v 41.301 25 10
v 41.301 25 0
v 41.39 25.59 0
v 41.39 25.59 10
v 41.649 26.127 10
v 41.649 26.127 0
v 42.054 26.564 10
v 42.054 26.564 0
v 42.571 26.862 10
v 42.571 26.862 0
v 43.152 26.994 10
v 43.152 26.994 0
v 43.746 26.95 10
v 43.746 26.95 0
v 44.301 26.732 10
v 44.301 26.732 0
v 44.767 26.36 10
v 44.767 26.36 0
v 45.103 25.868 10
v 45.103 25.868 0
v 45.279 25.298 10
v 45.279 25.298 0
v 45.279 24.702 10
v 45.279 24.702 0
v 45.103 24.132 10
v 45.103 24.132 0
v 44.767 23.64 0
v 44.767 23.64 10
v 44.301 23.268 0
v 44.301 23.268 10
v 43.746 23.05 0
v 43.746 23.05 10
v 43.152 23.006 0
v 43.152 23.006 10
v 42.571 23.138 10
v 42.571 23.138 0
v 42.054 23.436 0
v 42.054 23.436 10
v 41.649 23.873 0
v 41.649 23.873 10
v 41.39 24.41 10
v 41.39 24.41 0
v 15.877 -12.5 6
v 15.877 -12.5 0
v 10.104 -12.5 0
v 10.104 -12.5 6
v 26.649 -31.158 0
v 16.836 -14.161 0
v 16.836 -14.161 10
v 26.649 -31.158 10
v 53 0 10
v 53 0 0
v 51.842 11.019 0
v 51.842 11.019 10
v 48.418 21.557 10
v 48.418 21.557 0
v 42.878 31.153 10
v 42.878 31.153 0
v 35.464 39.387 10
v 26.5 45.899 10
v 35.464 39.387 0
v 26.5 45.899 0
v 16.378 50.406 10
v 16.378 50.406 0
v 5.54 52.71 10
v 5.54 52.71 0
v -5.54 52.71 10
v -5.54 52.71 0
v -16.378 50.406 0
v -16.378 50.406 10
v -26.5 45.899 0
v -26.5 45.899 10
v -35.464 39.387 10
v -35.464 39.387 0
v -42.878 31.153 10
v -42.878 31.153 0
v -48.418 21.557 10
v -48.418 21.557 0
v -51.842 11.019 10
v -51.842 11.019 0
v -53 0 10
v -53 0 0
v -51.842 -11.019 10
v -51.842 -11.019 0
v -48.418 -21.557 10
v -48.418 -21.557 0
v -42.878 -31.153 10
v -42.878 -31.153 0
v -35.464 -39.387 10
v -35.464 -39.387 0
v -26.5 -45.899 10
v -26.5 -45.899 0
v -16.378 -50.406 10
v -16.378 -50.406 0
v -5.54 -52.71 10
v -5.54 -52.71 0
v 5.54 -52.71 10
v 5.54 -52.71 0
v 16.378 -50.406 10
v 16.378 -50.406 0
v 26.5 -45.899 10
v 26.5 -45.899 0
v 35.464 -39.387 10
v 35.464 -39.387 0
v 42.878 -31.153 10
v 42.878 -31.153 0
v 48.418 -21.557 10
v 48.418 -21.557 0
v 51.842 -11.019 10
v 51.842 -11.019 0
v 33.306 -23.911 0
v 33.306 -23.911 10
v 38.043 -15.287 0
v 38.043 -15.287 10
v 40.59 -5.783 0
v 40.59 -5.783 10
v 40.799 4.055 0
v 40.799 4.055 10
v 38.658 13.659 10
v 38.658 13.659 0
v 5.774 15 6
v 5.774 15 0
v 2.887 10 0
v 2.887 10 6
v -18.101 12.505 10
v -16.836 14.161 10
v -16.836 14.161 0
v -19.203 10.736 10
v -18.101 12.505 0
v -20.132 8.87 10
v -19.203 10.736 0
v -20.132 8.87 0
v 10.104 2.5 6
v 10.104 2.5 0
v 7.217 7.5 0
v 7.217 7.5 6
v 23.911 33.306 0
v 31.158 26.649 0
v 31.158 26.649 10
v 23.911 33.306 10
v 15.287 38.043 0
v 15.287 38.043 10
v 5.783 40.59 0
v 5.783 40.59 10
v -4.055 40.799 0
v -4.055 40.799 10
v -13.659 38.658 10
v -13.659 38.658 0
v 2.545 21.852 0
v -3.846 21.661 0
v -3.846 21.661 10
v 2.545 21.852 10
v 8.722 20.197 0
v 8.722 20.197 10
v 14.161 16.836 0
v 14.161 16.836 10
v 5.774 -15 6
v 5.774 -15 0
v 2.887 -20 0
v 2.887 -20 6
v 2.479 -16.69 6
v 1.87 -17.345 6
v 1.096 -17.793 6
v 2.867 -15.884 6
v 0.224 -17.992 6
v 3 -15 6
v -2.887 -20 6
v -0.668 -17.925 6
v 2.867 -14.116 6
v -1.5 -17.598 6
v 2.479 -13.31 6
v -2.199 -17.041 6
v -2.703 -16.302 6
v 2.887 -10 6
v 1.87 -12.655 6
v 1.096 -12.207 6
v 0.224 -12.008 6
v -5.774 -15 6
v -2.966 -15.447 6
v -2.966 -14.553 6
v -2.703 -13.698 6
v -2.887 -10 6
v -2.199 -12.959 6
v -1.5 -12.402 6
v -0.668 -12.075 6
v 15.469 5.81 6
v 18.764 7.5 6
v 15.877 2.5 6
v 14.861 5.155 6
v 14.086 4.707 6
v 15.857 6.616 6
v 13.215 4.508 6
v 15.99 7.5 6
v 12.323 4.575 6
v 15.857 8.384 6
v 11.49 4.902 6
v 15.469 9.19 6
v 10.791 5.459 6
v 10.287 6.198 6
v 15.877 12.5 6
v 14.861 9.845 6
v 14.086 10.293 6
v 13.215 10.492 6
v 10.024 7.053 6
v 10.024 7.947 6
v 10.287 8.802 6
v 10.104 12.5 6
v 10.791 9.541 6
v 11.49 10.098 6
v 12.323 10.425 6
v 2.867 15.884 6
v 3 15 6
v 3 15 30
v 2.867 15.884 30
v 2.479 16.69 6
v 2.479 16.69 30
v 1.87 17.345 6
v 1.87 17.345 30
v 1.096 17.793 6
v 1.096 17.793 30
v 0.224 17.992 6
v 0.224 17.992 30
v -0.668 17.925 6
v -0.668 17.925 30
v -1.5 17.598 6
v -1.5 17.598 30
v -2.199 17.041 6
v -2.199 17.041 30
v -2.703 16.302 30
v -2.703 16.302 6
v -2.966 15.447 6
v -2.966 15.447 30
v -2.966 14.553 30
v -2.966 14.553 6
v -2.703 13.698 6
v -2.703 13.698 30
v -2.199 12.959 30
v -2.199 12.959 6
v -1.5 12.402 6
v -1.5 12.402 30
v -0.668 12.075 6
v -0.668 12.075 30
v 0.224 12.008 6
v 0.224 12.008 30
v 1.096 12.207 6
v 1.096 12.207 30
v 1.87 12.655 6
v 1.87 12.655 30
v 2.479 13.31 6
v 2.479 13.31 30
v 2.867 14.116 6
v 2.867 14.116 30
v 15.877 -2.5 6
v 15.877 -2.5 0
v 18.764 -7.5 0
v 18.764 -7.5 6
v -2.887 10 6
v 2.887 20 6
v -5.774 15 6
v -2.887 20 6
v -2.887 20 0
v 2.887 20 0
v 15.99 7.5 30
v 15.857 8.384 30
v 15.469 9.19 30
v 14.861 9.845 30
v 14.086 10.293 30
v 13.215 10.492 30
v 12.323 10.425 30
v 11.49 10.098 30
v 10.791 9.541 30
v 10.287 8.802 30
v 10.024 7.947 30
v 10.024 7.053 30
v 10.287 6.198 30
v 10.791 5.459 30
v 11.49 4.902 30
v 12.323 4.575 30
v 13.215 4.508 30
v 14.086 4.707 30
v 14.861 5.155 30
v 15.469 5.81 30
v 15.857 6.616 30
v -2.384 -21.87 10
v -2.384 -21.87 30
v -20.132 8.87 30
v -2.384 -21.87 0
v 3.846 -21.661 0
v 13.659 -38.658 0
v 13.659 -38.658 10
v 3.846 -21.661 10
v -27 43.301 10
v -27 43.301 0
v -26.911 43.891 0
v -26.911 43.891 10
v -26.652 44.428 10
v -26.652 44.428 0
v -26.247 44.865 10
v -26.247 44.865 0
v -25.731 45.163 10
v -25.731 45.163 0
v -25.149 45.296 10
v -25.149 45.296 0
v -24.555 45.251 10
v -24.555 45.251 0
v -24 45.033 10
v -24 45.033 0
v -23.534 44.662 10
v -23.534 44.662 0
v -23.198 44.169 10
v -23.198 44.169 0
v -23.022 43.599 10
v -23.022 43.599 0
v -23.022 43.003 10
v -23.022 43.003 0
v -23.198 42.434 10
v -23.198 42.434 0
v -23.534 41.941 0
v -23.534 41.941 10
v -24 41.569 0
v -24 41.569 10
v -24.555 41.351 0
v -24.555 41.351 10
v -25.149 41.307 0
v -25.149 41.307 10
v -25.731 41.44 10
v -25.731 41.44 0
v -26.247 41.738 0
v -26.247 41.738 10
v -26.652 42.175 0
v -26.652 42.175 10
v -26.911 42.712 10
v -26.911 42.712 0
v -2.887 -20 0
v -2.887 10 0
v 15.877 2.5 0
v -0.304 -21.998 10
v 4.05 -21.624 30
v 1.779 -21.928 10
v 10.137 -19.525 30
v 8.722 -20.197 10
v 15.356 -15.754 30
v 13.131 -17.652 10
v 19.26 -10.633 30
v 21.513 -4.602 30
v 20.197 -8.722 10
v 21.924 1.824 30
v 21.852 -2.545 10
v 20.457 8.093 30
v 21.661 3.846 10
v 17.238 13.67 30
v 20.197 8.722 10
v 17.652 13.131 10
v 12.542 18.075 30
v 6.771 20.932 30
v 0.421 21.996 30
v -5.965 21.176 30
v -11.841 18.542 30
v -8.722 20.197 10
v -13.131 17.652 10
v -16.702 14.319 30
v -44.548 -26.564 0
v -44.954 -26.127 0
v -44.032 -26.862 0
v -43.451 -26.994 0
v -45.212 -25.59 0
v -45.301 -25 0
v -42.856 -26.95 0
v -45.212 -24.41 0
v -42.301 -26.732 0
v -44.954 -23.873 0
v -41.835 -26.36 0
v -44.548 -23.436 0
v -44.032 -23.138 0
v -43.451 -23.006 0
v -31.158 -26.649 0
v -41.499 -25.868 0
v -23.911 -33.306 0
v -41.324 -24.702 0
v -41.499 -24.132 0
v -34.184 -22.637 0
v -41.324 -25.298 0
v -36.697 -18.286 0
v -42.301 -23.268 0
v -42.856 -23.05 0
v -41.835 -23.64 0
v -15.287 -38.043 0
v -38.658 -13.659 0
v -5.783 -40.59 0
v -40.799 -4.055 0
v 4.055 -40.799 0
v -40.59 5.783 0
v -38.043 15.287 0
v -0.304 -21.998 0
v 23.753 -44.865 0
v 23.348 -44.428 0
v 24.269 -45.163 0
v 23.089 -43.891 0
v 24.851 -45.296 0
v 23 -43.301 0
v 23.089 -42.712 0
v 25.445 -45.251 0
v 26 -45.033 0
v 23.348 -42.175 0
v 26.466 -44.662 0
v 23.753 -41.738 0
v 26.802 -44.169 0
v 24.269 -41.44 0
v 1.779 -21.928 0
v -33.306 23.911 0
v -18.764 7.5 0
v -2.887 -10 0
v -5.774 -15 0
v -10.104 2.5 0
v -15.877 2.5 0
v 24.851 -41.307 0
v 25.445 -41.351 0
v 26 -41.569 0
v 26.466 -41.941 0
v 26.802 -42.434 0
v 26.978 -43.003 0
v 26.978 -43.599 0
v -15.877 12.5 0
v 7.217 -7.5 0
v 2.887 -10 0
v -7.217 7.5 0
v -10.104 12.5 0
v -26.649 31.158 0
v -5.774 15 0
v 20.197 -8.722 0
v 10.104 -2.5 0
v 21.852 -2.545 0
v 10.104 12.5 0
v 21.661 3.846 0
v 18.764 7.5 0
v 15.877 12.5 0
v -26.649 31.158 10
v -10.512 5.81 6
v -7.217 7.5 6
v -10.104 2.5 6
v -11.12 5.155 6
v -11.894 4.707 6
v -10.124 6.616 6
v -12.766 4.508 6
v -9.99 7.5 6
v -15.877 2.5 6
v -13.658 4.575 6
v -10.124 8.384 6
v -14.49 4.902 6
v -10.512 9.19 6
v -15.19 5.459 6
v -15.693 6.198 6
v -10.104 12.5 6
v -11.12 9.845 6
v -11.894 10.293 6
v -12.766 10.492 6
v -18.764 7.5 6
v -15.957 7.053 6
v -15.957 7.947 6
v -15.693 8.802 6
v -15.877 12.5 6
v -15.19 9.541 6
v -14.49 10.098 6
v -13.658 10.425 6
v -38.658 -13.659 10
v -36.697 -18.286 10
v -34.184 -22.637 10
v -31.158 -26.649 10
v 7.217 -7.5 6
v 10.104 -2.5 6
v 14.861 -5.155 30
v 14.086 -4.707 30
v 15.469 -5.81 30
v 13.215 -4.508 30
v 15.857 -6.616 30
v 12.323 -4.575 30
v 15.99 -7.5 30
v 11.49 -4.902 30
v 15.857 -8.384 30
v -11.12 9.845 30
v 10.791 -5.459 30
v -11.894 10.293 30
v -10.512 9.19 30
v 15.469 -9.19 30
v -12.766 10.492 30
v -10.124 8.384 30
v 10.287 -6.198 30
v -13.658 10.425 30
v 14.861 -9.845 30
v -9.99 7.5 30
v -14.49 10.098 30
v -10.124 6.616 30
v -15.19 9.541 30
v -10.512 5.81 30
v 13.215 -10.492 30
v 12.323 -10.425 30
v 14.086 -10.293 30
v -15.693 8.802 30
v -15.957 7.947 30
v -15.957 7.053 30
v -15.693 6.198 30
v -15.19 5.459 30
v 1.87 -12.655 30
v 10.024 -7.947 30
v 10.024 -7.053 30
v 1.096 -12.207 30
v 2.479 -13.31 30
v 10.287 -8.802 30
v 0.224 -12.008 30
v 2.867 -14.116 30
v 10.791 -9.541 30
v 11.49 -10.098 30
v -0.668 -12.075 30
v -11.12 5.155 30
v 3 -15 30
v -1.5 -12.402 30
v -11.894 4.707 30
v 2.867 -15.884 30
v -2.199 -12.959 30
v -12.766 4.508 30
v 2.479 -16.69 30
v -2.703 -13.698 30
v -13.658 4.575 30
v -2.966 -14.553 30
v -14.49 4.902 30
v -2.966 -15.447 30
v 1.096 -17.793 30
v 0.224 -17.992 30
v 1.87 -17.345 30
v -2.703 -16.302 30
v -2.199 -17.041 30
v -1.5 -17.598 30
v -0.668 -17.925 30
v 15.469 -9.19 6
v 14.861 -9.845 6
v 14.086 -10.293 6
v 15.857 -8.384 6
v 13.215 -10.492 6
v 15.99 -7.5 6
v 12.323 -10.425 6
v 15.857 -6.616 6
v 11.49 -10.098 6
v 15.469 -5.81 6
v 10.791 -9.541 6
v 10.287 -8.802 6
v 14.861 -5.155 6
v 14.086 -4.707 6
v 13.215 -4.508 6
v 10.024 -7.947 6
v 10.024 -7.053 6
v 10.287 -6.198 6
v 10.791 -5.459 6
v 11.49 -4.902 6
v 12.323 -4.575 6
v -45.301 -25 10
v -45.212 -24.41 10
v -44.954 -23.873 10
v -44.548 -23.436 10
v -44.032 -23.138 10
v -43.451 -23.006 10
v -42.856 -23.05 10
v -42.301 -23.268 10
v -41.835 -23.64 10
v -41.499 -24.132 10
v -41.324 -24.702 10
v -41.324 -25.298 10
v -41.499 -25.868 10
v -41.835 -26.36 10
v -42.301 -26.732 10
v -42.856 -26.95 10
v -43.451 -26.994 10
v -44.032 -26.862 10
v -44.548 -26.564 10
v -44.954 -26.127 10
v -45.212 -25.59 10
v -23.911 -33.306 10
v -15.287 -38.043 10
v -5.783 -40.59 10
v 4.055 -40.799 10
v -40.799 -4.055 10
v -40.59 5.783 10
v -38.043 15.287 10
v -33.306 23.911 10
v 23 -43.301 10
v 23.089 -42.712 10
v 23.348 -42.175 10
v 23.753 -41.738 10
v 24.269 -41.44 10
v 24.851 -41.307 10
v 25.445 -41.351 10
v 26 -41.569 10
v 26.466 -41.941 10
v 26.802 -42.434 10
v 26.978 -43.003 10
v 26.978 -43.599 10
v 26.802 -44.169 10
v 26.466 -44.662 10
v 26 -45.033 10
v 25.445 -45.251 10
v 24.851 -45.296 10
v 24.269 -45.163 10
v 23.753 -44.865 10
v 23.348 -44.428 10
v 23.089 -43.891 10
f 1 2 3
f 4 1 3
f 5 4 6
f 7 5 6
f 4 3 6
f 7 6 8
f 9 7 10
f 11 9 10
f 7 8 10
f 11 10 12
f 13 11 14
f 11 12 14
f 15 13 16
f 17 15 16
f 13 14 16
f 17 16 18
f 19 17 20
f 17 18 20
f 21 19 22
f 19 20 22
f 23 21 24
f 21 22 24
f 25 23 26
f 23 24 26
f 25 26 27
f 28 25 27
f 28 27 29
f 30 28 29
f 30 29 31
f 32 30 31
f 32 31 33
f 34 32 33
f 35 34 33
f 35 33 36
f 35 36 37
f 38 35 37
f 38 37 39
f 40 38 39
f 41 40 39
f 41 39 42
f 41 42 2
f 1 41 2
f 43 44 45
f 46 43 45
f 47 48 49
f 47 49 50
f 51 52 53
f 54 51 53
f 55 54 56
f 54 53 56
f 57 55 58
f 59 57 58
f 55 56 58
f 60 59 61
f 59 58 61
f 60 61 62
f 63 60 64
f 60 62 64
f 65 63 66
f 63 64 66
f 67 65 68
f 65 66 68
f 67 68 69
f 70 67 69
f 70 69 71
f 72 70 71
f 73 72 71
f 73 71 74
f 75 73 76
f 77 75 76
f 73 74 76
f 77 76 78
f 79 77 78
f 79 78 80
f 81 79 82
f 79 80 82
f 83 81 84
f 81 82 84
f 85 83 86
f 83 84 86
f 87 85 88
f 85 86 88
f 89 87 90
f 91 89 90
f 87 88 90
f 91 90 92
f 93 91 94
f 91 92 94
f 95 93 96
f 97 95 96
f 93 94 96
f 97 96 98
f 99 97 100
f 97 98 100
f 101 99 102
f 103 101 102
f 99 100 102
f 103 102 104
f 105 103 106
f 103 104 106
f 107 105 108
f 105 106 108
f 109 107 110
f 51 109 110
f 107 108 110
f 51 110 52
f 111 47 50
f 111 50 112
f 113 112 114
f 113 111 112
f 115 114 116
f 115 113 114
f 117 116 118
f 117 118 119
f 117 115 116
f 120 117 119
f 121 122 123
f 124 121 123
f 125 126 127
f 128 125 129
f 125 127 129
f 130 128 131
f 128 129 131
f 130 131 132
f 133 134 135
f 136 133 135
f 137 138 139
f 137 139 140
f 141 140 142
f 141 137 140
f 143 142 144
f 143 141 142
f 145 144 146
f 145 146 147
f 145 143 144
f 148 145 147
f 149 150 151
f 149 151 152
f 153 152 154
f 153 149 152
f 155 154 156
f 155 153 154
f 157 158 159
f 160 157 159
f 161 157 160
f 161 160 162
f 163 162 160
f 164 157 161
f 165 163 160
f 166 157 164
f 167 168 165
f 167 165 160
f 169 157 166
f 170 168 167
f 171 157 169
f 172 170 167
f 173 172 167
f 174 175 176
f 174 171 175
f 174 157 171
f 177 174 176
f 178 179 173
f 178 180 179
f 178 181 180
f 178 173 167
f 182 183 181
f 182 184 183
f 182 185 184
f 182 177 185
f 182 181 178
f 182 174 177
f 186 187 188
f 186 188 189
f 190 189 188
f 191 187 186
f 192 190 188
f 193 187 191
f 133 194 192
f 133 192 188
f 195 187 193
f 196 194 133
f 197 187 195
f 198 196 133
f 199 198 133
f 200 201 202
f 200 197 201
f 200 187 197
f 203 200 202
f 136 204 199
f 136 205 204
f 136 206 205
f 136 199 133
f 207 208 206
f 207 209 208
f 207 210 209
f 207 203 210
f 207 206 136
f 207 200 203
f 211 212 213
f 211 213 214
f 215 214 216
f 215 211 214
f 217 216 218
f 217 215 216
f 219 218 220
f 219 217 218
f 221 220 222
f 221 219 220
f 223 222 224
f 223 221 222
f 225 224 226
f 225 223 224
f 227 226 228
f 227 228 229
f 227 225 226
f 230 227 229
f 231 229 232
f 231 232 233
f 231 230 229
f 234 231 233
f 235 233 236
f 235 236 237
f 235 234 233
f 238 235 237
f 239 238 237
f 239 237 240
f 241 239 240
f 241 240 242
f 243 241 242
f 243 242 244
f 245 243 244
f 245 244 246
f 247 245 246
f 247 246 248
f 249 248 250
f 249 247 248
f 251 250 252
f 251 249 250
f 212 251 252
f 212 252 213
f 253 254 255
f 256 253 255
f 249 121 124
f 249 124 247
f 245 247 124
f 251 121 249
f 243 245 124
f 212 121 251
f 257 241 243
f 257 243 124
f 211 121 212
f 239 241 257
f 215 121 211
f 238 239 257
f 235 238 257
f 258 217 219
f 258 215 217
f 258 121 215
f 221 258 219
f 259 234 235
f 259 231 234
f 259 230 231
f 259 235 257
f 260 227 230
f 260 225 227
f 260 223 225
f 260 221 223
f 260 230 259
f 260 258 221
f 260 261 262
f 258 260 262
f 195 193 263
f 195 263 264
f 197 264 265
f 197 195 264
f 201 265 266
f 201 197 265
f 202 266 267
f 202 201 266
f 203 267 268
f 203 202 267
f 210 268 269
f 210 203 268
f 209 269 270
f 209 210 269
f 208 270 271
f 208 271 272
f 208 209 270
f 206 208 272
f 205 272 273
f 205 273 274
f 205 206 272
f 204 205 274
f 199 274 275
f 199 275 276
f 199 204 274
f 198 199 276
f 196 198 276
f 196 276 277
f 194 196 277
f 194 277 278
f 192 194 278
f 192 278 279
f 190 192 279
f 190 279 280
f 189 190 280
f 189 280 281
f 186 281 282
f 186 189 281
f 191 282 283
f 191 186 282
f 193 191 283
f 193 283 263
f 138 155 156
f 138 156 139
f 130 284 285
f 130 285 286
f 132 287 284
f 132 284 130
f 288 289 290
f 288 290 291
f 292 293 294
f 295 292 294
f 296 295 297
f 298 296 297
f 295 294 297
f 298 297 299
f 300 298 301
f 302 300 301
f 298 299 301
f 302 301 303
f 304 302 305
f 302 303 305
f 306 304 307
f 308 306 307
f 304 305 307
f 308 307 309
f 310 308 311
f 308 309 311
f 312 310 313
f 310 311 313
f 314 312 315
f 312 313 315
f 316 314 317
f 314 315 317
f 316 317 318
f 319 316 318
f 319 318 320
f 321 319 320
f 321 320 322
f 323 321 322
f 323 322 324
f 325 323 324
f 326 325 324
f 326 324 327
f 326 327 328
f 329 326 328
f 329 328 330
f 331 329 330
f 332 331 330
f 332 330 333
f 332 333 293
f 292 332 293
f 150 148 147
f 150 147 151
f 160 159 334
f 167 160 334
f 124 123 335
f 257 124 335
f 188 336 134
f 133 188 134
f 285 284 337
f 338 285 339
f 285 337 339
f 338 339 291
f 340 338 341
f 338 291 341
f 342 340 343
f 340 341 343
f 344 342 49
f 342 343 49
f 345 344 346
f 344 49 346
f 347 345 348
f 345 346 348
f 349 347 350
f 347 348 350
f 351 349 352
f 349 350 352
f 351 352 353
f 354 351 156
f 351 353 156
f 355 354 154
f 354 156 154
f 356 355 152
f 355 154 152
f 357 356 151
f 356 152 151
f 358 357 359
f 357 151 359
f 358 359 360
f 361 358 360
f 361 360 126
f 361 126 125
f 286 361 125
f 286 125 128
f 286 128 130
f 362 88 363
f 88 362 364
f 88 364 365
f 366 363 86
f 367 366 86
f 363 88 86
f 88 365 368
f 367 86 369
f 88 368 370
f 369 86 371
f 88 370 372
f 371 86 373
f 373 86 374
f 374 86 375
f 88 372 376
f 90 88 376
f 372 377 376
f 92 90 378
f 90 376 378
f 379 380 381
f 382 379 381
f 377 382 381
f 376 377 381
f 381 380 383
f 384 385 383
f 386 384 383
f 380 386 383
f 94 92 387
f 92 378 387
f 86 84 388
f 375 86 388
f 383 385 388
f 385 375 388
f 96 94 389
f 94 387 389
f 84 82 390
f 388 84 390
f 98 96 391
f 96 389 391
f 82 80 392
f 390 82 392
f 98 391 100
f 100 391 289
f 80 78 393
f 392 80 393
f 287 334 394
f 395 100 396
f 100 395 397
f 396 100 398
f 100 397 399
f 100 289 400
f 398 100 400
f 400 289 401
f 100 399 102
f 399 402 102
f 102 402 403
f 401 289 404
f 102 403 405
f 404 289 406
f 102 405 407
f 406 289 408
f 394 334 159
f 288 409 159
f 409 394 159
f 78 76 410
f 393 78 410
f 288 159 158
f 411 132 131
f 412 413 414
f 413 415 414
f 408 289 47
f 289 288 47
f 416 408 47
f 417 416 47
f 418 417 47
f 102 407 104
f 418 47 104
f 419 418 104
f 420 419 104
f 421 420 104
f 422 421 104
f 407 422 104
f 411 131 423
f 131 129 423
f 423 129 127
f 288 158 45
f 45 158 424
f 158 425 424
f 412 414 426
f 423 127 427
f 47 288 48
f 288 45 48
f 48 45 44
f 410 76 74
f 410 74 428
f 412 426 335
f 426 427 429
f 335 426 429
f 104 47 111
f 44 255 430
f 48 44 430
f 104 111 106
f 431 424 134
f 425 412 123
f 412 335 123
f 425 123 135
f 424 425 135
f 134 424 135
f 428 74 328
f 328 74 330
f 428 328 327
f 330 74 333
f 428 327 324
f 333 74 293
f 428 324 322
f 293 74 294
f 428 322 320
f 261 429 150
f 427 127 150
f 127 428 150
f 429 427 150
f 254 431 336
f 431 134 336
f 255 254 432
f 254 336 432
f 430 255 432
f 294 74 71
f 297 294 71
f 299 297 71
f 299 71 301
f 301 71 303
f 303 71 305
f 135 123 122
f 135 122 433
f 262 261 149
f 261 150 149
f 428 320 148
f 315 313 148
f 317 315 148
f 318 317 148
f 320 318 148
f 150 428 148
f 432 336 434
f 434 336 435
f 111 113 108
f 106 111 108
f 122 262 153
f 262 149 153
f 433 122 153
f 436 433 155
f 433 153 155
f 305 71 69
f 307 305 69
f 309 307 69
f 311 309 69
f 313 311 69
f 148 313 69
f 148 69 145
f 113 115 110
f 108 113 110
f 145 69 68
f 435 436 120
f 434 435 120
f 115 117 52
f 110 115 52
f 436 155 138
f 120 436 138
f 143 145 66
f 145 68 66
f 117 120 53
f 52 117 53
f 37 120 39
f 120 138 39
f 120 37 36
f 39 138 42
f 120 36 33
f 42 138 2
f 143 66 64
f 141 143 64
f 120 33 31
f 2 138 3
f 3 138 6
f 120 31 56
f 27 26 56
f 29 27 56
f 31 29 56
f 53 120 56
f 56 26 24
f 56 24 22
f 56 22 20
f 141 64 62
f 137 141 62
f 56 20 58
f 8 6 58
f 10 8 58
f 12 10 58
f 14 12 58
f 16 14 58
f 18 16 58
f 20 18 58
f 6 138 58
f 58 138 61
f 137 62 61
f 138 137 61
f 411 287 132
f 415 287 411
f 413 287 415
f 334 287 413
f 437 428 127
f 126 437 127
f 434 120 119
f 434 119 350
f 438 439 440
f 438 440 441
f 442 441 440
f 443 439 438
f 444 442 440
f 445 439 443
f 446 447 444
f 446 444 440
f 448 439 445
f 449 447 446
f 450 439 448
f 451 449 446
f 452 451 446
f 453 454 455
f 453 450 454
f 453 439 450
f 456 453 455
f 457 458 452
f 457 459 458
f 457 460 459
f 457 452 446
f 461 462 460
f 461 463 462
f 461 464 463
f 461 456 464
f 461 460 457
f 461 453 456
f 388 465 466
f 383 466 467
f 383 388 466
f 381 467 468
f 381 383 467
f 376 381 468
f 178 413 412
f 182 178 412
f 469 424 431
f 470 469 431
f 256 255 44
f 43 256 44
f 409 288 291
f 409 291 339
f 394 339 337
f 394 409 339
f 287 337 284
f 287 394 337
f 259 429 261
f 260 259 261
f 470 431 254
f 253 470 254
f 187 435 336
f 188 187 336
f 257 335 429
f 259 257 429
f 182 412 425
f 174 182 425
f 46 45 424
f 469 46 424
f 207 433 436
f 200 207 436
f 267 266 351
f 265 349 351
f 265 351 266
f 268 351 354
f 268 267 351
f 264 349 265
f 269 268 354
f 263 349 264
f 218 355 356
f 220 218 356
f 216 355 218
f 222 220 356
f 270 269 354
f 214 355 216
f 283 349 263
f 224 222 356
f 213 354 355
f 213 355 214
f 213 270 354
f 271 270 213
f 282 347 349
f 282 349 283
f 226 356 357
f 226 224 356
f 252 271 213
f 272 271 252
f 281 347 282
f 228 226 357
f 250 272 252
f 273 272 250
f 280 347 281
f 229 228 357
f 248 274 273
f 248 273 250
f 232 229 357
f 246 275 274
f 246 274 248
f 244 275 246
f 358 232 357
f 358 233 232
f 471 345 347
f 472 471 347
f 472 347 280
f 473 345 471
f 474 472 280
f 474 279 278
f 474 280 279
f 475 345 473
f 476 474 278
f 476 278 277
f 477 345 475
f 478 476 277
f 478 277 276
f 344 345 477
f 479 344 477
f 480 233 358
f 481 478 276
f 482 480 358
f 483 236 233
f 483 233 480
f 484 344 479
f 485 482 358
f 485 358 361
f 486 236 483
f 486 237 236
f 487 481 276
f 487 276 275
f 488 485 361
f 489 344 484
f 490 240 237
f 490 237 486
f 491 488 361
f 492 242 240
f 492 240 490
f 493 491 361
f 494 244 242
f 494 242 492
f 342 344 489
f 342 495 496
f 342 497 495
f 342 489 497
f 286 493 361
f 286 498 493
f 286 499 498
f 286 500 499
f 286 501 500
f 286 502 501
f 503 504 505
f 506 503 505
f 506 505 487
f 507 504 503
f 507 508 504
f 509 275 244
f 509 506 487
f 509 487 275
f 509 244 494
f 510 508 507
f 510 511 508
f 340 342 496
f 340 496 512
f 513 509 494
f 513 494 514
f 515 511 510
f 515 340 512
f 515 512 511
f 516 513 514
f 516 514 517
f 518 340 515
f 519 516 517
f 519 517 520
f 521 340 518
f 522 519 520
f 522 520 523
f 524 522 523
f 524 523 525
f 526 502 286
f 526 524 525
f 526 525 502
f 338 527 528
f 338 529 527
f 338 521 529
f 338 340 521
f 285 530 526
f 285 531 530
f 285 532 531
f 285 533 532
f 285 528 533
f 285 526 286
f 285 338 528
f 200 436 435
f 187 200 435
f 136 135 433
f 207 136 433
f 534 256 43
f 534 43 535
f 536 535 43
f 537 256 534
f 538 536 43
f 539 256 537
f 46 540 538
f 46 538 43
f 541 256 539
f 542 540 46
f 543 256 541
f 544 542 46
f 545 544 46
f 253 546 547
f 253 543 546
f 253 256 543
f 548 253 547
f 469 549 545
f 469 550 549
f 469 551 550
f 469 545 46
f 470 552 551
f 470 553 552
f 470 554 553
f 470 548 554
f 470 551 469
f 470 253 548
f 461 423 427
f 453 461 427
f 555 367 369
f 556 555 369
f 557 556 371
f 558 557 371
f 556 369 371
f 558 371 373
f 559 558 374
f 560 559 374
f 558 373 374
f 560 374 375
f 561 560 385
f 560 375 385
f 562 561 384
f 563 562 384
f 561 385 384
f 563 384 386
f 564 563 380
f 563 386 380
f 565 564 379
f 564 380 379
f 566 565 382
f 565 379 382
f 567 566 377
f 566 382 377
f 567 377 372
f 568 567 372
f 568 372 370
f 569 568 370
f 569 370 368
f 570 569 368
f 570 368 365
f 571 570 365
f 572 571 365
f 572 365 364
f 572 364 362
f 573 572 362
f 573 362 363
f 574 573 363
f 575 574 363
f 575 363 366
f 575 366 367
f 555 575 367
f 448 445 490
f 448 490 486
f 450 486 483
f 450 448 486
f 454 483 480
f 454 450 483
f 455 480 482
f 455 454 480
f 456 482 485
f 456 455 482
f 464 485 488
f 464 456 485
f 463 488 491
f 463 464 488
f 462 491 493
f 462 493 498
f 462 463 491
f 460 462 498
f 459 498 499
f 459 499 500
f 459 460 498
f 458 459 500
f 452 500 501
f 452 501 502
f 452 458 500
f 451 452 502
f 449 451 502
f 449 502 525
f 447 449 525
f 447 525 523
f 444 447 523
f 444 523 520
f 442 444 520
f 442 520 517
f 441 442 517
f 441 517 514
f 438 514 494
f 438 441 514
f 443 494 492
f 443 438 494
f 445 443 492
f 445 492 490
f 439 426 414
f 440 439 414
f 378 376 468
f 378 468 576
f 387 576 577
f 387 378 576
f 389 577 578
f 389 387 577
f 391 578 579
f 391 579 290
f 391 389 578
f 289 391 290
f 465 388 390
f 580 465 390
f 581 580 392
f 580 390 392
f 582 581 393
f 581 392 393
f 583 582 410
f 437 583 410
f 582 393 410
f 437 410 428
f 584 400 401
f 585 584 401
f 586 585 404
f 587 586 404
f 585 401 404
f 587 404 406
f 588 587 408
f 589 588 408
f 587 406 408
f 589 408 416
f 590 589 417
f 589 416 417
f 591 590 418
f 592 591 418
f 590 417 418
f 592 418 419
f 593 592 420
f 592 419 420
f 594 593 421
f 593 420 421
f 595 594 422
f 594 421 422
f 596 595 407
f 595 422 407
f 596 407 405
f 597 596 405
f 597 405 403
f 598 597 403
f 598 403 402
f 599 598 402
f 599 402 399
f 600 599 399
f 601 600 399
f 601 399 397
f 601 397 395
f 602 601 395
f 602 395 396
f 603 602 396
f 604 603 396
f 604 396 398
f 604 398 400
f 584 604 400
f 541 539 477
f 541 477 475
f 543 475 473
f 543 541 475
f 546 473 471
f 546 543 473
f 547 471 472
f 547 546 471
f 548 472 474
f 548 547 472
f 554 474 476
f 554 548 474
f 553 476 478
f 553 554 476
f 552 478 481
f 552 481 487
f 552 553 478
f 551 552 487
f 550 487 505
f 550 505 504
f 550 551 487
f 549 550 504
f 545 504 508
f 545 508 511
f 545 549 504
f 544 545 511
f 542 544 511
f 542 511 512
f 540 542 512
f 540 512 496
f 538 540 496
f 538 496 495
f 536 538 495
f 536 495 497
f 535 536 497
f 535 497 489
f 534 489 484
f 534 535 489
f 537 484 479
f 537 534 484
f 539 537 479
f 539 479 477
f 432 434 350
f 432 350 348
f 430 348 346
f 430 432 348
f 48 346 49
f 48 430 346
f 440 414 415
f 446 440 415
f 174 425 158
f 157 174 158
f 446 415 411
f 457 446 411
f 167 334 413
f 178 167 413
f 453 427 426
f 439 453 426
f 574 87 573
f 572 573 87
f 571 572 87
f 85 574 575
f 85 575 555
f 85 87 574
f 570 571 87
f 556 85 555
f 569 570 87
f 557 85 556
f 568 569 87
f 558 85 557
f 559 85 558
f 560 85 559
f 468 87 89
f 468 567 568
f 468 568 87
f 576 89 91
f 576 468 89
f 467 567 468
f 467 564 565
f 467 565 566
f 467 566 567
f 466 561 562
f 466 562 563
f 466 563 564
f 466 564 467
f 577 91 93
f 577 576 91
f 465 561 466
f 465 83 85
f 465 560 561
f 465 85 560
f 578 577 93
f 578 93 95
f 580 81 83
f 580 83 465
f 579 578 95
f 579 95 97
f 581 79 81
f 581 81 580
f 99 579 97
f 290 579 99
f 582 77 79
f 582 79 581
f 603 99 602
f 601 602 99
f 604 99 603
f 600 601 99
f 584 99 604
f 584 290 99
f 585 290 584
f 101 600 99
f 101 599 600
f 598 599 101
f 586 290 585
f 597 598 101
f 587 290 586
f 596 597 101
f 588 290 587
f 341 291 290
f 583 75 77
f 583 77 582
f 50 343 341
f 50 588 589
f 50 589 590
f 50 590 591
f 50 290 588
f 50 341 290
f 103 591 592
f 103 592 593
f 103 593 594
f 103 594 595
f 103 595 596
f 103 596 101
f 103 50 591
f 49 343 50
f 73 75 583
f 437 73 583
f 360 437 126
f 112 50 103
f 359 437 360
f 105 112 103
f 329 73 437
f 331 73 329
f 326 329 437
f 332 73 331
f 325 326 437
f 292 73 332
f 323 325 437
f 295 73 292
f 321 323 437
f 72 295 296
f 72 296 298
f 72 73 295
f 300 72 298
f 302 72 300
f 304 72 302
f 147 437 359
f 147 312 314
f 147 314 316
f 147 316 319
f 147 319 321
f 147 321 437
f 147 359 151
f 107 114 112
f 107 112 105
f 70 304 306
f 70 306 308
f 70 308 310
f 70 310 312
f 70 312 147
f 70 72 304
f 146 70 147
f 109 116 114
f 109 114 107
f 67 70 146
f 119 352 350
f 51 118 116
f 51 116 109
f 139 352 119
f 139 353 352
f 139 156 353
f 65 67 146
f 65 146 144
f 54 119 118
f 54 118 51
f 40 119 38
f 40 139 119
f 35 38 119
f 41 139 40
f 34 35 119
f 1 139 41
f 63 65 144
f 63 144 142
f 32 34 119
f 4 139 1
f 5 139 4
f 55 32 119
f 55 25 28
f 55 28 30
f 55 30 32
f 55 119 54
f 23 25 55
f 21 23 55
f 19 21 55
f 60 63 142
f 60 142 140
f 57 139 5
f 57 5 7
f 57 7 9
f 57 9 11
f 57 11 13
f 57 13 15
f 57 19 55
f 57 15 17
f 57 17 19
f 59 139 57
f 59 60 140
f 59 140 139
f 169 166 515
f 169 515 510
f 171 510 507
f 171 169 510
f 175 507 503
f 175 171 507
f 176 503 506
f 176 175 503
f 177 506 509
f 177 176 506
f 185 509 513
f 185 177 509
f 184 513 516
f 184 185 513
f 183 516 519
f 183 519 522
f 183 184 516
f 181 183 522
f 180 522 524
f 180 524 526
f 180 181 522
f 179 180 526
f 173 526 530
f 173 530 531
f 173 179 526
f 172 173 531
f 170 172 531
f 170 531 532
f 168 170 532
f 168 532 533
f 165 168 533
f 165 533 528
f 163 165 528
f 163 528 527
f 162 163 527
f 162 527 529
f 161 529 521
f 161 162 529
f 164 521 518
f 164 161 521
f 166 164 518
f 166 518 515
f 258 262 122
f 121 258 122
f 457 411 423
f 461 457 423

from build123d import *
from build123d.topology import SkipClean

# Parameters (mm, degrees)
ESQUISSE2_R             = 53
ESQUISSE2_R_2           = 3
BOSS_EXTRU_1_DEPTH      = 10
ESQUISSE3_R             = 22
ESQUISSE3_R_2           = 3
BOSS_EXTRU_2_DEPTH      = 20
ENL_V_MAT_EXTRU_1_DEPTH = 6
ENL_V_MAT_EXTRU_2_DEPTH = 81.734131568
ESQUISSE7_R             = 2
ENL_V_MAT_EXTRU_3_DEPTH = 81.734131568


with BuildPart() as part:
    # Esquisse2 → Boss.-Extru.1 (new body)
    with BuildSketch(Plane.XY):
        Circle(ESQUISSE2_R)
        with Locations((0, -15)):
            Circle(ESQUISSE2_R_2, mode=Mode.SUBTRACT)
        with Locations((12.990381057, -7.5)):
            Circle(ESQUISSE2_R_2, mode=Mode.SUBTRACT)
        with Locations((12.990381057, 7.5)):
            Circle(ESQUISSE2_R_2, mode=Mode.SUBTRACT)
        with Locations((0, 15)):
            Circle(ESQUISSE2_R_2, mode=Mode.SUBTRACT)
        with Locations((-12.990381057, 7.5)):
            Circle(ESQUISSE2_R_2, mode=Mode.SUBTRACT)
        with BuildLine():
            Line((-26.649284405, 31.157914575), (-16.836249468, 14.161239488))
            ThreePointArc((-16.836249468, 14.161239488), (-21.250368178, 5.694018992), (-21.661239488, -3.845868412))
            Line((-21.661239488, -3.845868412), (-38.657914575, -13.658903349))
            ThreePointArc((-38.657914575, -13.658903349), (-39.602958878, 10.611580849), (-26.649284405, 31.157914575))
        make_face(mode=Mode.SUBTRACT)
        with BuildLine():
            Line((-13.658903349, 38.657914575), (-3.845868412, 21.661239488))
            ThreePointArc((-3.845868412, 21.661239488), (5.694018992, 21.250368178), (14.161239488, 16.836249468))
            Line((14.161239488, 16.836249468), (31.157914575, 26.649284405))
            ThreePointArc((31.157914575, 26.649284405), (10.611580849, 39.602958878), (-13.658903349, 38.657914575))
        make_face(mode=Mode.SUBTRACT)
        with BuildLine():
            Line((38.657914575, 13.658903349), (21.661239488, 3.845868412))
            ThreePointArc((21.661239488, 3.845868412), (21.250368178, -5.694018992), (16.836249468, -14.161239488))
            Line((16.836249468, -14.161239488), (26.649284405, -31.157914575))
            ThreePointArc((26.649284405, -31.157914575), (39.602958878, -10.611580849), (38.657914575, 13.658903349))
        make_face(mode=Mode.SUBTRACT)
        with BuildLine():
            Line((13.658903349, -38.657914575), (3.845868412, -21.661239488))
            ThreePointArc((3.845868412, -21.661239488), (-5.694018992, -21.250368178), (-14.161239488, -16.836249468))
            Line((-14.161239488, -16.836249468), (-31.157914575, -26.649284405))
            ThreePointArc((-31.157914575, -26.649284405), (-10.611580849, -39.602958878), (13.658903349, -38.657914575))
        make_face(mode=Mode.SUBTRACT)
    extrude(amount=BOSS_EXTRU_1_DEPTH)

    # Esquisse3 → Boss.-Extru.2 (add)
    with BuildSketch(Plane.XY.offset(10)):
        with Locations(Location((0, 0, 0), (0, 0, 190.067729528))):
            Circle(ESQUISSE3_R)
        with Locations((-12.990381057, 7.5)):
            Circle(ESQUISSE3_R_2, mode=Mode.SUBTRACT)
        with Locations((0, 15)):
            Circle(ESQUISSE3_R_2, mode=Mode.SUBTRACT)
        with Locations((12.990381057, 7.5)):
            Circle(ESQUISSE3_R_2, mode=Mode.SUBTRACT)
        with Locations((12.990381057, -7.5)):
            Circle(ESQUISSE3_R_2, mode=Mode.SUBTRACT)
        with Locations((0, -15)):
            Circle(ESQUISSE3_R_2, mode=Mode.SUBTRACT)
    extrude(amount=BOSS_EXTRU_2_DEPTH)

    # Esquisse4 → Enlèv. mat.-Extru.1 (cut)
    with BuildSketch(Plane(origin=(0, 0, 0), x_dir=(-1, 0, 0), z_dir=(0, 0, -1))):
        Polygon((15.877132403, 2.5), (18.763883749, 7.5), (15.877132403, 12.5), (10.103629711, 12.5), (7.216878365, 7.5), (10.103629711, 2.5), align=None)
        Polygon((-2.886751346, 20), (-5.773502692, 15), (-2.886751346, 10), (2.886751346, 10), (5.773502692, 15), (2.886751346, 20), align=None)
        Polygon((-18.763883749, 7.5), (-15.877132403, 2.5), (-10.103629711, 2.5), (-7.216878365, 7.5), (-10.103629711, 12.5), (-15.877132403, 12.5), align=None)
        Polygon((-15.877132403, -12.5), (-10.103629711, -12.5), (-7.216878365, -7.5), (-10.103629711, -2.5), (-15.877132403, -2.5), (-18.763883749, -7.5), align=None)
        Polygon((2.886751346, -20), (5.773502692, -15), (2.886751346, -10), (-2.886751346, -10), (-5.773502692, -15), (-2.886751346, -20), align=None)
    extrude(amount=-ENL_V_MAT_EXTRU_1_DEPTH, mode=Mode.SUBTRACT)

    # Esquisse5 → Enlèv. mat.-Extru.2 (cut, through all)
    with SkipClean():  # the faces are left unmerged after this step: merging them gives an invalid solid
        with BuildSketch(Plane(origin=(0, 0, 0), x_dir=(-1, 0, 0), z_dir=(0, 0, -1))):
            with BuildLine():
                Line((2.384210575, -21.870426149), (20.132449924, 8.870426149))
                Line((20.132449924, 8.870426149), (38.657914575, -13.658903349))
                ThreePointArc((38.657914575, -13.658903349), (35.507041555, -20.5), (31.157914575, -26.649284405))
                Line((31.157914575, -26.649284405), (2.384210575, -21.870426149))
            make_face()
        extrude(amount=-ENL_V_MAT_EXTRU_2_DEPTH, mode=Mode.SUBTRACT)

    # Esquisse7 → Enlèv. mat.-Extru.3 (cut, through all)
    with SkipClean():  # the faces are left unmerged after this step: merging them gives an invalid solid
        with BuildSketch(Plane(origin=(0, 0, 0), x_dir=(-1, 0, 0), z_dir=(0, 0, -1))):
            with Locations((-43.301270189, 25)):
                Circle(ESQUISSE7_R)
            with Locations((25, 43.301270189)):
                Circle(ESQUISSE7_R)
            with Locations((43.301270189, -25)):
                Circle(ESQUISSE7_R)
            with Locations((-25, -43.301270189)):
                Circle(ESQUISSE7_R)
        extrude(amount=-ENL_V_MAT_EXTRU_3_DEPTH, mode=Mode.SUBTRACT)


solid = part.part
